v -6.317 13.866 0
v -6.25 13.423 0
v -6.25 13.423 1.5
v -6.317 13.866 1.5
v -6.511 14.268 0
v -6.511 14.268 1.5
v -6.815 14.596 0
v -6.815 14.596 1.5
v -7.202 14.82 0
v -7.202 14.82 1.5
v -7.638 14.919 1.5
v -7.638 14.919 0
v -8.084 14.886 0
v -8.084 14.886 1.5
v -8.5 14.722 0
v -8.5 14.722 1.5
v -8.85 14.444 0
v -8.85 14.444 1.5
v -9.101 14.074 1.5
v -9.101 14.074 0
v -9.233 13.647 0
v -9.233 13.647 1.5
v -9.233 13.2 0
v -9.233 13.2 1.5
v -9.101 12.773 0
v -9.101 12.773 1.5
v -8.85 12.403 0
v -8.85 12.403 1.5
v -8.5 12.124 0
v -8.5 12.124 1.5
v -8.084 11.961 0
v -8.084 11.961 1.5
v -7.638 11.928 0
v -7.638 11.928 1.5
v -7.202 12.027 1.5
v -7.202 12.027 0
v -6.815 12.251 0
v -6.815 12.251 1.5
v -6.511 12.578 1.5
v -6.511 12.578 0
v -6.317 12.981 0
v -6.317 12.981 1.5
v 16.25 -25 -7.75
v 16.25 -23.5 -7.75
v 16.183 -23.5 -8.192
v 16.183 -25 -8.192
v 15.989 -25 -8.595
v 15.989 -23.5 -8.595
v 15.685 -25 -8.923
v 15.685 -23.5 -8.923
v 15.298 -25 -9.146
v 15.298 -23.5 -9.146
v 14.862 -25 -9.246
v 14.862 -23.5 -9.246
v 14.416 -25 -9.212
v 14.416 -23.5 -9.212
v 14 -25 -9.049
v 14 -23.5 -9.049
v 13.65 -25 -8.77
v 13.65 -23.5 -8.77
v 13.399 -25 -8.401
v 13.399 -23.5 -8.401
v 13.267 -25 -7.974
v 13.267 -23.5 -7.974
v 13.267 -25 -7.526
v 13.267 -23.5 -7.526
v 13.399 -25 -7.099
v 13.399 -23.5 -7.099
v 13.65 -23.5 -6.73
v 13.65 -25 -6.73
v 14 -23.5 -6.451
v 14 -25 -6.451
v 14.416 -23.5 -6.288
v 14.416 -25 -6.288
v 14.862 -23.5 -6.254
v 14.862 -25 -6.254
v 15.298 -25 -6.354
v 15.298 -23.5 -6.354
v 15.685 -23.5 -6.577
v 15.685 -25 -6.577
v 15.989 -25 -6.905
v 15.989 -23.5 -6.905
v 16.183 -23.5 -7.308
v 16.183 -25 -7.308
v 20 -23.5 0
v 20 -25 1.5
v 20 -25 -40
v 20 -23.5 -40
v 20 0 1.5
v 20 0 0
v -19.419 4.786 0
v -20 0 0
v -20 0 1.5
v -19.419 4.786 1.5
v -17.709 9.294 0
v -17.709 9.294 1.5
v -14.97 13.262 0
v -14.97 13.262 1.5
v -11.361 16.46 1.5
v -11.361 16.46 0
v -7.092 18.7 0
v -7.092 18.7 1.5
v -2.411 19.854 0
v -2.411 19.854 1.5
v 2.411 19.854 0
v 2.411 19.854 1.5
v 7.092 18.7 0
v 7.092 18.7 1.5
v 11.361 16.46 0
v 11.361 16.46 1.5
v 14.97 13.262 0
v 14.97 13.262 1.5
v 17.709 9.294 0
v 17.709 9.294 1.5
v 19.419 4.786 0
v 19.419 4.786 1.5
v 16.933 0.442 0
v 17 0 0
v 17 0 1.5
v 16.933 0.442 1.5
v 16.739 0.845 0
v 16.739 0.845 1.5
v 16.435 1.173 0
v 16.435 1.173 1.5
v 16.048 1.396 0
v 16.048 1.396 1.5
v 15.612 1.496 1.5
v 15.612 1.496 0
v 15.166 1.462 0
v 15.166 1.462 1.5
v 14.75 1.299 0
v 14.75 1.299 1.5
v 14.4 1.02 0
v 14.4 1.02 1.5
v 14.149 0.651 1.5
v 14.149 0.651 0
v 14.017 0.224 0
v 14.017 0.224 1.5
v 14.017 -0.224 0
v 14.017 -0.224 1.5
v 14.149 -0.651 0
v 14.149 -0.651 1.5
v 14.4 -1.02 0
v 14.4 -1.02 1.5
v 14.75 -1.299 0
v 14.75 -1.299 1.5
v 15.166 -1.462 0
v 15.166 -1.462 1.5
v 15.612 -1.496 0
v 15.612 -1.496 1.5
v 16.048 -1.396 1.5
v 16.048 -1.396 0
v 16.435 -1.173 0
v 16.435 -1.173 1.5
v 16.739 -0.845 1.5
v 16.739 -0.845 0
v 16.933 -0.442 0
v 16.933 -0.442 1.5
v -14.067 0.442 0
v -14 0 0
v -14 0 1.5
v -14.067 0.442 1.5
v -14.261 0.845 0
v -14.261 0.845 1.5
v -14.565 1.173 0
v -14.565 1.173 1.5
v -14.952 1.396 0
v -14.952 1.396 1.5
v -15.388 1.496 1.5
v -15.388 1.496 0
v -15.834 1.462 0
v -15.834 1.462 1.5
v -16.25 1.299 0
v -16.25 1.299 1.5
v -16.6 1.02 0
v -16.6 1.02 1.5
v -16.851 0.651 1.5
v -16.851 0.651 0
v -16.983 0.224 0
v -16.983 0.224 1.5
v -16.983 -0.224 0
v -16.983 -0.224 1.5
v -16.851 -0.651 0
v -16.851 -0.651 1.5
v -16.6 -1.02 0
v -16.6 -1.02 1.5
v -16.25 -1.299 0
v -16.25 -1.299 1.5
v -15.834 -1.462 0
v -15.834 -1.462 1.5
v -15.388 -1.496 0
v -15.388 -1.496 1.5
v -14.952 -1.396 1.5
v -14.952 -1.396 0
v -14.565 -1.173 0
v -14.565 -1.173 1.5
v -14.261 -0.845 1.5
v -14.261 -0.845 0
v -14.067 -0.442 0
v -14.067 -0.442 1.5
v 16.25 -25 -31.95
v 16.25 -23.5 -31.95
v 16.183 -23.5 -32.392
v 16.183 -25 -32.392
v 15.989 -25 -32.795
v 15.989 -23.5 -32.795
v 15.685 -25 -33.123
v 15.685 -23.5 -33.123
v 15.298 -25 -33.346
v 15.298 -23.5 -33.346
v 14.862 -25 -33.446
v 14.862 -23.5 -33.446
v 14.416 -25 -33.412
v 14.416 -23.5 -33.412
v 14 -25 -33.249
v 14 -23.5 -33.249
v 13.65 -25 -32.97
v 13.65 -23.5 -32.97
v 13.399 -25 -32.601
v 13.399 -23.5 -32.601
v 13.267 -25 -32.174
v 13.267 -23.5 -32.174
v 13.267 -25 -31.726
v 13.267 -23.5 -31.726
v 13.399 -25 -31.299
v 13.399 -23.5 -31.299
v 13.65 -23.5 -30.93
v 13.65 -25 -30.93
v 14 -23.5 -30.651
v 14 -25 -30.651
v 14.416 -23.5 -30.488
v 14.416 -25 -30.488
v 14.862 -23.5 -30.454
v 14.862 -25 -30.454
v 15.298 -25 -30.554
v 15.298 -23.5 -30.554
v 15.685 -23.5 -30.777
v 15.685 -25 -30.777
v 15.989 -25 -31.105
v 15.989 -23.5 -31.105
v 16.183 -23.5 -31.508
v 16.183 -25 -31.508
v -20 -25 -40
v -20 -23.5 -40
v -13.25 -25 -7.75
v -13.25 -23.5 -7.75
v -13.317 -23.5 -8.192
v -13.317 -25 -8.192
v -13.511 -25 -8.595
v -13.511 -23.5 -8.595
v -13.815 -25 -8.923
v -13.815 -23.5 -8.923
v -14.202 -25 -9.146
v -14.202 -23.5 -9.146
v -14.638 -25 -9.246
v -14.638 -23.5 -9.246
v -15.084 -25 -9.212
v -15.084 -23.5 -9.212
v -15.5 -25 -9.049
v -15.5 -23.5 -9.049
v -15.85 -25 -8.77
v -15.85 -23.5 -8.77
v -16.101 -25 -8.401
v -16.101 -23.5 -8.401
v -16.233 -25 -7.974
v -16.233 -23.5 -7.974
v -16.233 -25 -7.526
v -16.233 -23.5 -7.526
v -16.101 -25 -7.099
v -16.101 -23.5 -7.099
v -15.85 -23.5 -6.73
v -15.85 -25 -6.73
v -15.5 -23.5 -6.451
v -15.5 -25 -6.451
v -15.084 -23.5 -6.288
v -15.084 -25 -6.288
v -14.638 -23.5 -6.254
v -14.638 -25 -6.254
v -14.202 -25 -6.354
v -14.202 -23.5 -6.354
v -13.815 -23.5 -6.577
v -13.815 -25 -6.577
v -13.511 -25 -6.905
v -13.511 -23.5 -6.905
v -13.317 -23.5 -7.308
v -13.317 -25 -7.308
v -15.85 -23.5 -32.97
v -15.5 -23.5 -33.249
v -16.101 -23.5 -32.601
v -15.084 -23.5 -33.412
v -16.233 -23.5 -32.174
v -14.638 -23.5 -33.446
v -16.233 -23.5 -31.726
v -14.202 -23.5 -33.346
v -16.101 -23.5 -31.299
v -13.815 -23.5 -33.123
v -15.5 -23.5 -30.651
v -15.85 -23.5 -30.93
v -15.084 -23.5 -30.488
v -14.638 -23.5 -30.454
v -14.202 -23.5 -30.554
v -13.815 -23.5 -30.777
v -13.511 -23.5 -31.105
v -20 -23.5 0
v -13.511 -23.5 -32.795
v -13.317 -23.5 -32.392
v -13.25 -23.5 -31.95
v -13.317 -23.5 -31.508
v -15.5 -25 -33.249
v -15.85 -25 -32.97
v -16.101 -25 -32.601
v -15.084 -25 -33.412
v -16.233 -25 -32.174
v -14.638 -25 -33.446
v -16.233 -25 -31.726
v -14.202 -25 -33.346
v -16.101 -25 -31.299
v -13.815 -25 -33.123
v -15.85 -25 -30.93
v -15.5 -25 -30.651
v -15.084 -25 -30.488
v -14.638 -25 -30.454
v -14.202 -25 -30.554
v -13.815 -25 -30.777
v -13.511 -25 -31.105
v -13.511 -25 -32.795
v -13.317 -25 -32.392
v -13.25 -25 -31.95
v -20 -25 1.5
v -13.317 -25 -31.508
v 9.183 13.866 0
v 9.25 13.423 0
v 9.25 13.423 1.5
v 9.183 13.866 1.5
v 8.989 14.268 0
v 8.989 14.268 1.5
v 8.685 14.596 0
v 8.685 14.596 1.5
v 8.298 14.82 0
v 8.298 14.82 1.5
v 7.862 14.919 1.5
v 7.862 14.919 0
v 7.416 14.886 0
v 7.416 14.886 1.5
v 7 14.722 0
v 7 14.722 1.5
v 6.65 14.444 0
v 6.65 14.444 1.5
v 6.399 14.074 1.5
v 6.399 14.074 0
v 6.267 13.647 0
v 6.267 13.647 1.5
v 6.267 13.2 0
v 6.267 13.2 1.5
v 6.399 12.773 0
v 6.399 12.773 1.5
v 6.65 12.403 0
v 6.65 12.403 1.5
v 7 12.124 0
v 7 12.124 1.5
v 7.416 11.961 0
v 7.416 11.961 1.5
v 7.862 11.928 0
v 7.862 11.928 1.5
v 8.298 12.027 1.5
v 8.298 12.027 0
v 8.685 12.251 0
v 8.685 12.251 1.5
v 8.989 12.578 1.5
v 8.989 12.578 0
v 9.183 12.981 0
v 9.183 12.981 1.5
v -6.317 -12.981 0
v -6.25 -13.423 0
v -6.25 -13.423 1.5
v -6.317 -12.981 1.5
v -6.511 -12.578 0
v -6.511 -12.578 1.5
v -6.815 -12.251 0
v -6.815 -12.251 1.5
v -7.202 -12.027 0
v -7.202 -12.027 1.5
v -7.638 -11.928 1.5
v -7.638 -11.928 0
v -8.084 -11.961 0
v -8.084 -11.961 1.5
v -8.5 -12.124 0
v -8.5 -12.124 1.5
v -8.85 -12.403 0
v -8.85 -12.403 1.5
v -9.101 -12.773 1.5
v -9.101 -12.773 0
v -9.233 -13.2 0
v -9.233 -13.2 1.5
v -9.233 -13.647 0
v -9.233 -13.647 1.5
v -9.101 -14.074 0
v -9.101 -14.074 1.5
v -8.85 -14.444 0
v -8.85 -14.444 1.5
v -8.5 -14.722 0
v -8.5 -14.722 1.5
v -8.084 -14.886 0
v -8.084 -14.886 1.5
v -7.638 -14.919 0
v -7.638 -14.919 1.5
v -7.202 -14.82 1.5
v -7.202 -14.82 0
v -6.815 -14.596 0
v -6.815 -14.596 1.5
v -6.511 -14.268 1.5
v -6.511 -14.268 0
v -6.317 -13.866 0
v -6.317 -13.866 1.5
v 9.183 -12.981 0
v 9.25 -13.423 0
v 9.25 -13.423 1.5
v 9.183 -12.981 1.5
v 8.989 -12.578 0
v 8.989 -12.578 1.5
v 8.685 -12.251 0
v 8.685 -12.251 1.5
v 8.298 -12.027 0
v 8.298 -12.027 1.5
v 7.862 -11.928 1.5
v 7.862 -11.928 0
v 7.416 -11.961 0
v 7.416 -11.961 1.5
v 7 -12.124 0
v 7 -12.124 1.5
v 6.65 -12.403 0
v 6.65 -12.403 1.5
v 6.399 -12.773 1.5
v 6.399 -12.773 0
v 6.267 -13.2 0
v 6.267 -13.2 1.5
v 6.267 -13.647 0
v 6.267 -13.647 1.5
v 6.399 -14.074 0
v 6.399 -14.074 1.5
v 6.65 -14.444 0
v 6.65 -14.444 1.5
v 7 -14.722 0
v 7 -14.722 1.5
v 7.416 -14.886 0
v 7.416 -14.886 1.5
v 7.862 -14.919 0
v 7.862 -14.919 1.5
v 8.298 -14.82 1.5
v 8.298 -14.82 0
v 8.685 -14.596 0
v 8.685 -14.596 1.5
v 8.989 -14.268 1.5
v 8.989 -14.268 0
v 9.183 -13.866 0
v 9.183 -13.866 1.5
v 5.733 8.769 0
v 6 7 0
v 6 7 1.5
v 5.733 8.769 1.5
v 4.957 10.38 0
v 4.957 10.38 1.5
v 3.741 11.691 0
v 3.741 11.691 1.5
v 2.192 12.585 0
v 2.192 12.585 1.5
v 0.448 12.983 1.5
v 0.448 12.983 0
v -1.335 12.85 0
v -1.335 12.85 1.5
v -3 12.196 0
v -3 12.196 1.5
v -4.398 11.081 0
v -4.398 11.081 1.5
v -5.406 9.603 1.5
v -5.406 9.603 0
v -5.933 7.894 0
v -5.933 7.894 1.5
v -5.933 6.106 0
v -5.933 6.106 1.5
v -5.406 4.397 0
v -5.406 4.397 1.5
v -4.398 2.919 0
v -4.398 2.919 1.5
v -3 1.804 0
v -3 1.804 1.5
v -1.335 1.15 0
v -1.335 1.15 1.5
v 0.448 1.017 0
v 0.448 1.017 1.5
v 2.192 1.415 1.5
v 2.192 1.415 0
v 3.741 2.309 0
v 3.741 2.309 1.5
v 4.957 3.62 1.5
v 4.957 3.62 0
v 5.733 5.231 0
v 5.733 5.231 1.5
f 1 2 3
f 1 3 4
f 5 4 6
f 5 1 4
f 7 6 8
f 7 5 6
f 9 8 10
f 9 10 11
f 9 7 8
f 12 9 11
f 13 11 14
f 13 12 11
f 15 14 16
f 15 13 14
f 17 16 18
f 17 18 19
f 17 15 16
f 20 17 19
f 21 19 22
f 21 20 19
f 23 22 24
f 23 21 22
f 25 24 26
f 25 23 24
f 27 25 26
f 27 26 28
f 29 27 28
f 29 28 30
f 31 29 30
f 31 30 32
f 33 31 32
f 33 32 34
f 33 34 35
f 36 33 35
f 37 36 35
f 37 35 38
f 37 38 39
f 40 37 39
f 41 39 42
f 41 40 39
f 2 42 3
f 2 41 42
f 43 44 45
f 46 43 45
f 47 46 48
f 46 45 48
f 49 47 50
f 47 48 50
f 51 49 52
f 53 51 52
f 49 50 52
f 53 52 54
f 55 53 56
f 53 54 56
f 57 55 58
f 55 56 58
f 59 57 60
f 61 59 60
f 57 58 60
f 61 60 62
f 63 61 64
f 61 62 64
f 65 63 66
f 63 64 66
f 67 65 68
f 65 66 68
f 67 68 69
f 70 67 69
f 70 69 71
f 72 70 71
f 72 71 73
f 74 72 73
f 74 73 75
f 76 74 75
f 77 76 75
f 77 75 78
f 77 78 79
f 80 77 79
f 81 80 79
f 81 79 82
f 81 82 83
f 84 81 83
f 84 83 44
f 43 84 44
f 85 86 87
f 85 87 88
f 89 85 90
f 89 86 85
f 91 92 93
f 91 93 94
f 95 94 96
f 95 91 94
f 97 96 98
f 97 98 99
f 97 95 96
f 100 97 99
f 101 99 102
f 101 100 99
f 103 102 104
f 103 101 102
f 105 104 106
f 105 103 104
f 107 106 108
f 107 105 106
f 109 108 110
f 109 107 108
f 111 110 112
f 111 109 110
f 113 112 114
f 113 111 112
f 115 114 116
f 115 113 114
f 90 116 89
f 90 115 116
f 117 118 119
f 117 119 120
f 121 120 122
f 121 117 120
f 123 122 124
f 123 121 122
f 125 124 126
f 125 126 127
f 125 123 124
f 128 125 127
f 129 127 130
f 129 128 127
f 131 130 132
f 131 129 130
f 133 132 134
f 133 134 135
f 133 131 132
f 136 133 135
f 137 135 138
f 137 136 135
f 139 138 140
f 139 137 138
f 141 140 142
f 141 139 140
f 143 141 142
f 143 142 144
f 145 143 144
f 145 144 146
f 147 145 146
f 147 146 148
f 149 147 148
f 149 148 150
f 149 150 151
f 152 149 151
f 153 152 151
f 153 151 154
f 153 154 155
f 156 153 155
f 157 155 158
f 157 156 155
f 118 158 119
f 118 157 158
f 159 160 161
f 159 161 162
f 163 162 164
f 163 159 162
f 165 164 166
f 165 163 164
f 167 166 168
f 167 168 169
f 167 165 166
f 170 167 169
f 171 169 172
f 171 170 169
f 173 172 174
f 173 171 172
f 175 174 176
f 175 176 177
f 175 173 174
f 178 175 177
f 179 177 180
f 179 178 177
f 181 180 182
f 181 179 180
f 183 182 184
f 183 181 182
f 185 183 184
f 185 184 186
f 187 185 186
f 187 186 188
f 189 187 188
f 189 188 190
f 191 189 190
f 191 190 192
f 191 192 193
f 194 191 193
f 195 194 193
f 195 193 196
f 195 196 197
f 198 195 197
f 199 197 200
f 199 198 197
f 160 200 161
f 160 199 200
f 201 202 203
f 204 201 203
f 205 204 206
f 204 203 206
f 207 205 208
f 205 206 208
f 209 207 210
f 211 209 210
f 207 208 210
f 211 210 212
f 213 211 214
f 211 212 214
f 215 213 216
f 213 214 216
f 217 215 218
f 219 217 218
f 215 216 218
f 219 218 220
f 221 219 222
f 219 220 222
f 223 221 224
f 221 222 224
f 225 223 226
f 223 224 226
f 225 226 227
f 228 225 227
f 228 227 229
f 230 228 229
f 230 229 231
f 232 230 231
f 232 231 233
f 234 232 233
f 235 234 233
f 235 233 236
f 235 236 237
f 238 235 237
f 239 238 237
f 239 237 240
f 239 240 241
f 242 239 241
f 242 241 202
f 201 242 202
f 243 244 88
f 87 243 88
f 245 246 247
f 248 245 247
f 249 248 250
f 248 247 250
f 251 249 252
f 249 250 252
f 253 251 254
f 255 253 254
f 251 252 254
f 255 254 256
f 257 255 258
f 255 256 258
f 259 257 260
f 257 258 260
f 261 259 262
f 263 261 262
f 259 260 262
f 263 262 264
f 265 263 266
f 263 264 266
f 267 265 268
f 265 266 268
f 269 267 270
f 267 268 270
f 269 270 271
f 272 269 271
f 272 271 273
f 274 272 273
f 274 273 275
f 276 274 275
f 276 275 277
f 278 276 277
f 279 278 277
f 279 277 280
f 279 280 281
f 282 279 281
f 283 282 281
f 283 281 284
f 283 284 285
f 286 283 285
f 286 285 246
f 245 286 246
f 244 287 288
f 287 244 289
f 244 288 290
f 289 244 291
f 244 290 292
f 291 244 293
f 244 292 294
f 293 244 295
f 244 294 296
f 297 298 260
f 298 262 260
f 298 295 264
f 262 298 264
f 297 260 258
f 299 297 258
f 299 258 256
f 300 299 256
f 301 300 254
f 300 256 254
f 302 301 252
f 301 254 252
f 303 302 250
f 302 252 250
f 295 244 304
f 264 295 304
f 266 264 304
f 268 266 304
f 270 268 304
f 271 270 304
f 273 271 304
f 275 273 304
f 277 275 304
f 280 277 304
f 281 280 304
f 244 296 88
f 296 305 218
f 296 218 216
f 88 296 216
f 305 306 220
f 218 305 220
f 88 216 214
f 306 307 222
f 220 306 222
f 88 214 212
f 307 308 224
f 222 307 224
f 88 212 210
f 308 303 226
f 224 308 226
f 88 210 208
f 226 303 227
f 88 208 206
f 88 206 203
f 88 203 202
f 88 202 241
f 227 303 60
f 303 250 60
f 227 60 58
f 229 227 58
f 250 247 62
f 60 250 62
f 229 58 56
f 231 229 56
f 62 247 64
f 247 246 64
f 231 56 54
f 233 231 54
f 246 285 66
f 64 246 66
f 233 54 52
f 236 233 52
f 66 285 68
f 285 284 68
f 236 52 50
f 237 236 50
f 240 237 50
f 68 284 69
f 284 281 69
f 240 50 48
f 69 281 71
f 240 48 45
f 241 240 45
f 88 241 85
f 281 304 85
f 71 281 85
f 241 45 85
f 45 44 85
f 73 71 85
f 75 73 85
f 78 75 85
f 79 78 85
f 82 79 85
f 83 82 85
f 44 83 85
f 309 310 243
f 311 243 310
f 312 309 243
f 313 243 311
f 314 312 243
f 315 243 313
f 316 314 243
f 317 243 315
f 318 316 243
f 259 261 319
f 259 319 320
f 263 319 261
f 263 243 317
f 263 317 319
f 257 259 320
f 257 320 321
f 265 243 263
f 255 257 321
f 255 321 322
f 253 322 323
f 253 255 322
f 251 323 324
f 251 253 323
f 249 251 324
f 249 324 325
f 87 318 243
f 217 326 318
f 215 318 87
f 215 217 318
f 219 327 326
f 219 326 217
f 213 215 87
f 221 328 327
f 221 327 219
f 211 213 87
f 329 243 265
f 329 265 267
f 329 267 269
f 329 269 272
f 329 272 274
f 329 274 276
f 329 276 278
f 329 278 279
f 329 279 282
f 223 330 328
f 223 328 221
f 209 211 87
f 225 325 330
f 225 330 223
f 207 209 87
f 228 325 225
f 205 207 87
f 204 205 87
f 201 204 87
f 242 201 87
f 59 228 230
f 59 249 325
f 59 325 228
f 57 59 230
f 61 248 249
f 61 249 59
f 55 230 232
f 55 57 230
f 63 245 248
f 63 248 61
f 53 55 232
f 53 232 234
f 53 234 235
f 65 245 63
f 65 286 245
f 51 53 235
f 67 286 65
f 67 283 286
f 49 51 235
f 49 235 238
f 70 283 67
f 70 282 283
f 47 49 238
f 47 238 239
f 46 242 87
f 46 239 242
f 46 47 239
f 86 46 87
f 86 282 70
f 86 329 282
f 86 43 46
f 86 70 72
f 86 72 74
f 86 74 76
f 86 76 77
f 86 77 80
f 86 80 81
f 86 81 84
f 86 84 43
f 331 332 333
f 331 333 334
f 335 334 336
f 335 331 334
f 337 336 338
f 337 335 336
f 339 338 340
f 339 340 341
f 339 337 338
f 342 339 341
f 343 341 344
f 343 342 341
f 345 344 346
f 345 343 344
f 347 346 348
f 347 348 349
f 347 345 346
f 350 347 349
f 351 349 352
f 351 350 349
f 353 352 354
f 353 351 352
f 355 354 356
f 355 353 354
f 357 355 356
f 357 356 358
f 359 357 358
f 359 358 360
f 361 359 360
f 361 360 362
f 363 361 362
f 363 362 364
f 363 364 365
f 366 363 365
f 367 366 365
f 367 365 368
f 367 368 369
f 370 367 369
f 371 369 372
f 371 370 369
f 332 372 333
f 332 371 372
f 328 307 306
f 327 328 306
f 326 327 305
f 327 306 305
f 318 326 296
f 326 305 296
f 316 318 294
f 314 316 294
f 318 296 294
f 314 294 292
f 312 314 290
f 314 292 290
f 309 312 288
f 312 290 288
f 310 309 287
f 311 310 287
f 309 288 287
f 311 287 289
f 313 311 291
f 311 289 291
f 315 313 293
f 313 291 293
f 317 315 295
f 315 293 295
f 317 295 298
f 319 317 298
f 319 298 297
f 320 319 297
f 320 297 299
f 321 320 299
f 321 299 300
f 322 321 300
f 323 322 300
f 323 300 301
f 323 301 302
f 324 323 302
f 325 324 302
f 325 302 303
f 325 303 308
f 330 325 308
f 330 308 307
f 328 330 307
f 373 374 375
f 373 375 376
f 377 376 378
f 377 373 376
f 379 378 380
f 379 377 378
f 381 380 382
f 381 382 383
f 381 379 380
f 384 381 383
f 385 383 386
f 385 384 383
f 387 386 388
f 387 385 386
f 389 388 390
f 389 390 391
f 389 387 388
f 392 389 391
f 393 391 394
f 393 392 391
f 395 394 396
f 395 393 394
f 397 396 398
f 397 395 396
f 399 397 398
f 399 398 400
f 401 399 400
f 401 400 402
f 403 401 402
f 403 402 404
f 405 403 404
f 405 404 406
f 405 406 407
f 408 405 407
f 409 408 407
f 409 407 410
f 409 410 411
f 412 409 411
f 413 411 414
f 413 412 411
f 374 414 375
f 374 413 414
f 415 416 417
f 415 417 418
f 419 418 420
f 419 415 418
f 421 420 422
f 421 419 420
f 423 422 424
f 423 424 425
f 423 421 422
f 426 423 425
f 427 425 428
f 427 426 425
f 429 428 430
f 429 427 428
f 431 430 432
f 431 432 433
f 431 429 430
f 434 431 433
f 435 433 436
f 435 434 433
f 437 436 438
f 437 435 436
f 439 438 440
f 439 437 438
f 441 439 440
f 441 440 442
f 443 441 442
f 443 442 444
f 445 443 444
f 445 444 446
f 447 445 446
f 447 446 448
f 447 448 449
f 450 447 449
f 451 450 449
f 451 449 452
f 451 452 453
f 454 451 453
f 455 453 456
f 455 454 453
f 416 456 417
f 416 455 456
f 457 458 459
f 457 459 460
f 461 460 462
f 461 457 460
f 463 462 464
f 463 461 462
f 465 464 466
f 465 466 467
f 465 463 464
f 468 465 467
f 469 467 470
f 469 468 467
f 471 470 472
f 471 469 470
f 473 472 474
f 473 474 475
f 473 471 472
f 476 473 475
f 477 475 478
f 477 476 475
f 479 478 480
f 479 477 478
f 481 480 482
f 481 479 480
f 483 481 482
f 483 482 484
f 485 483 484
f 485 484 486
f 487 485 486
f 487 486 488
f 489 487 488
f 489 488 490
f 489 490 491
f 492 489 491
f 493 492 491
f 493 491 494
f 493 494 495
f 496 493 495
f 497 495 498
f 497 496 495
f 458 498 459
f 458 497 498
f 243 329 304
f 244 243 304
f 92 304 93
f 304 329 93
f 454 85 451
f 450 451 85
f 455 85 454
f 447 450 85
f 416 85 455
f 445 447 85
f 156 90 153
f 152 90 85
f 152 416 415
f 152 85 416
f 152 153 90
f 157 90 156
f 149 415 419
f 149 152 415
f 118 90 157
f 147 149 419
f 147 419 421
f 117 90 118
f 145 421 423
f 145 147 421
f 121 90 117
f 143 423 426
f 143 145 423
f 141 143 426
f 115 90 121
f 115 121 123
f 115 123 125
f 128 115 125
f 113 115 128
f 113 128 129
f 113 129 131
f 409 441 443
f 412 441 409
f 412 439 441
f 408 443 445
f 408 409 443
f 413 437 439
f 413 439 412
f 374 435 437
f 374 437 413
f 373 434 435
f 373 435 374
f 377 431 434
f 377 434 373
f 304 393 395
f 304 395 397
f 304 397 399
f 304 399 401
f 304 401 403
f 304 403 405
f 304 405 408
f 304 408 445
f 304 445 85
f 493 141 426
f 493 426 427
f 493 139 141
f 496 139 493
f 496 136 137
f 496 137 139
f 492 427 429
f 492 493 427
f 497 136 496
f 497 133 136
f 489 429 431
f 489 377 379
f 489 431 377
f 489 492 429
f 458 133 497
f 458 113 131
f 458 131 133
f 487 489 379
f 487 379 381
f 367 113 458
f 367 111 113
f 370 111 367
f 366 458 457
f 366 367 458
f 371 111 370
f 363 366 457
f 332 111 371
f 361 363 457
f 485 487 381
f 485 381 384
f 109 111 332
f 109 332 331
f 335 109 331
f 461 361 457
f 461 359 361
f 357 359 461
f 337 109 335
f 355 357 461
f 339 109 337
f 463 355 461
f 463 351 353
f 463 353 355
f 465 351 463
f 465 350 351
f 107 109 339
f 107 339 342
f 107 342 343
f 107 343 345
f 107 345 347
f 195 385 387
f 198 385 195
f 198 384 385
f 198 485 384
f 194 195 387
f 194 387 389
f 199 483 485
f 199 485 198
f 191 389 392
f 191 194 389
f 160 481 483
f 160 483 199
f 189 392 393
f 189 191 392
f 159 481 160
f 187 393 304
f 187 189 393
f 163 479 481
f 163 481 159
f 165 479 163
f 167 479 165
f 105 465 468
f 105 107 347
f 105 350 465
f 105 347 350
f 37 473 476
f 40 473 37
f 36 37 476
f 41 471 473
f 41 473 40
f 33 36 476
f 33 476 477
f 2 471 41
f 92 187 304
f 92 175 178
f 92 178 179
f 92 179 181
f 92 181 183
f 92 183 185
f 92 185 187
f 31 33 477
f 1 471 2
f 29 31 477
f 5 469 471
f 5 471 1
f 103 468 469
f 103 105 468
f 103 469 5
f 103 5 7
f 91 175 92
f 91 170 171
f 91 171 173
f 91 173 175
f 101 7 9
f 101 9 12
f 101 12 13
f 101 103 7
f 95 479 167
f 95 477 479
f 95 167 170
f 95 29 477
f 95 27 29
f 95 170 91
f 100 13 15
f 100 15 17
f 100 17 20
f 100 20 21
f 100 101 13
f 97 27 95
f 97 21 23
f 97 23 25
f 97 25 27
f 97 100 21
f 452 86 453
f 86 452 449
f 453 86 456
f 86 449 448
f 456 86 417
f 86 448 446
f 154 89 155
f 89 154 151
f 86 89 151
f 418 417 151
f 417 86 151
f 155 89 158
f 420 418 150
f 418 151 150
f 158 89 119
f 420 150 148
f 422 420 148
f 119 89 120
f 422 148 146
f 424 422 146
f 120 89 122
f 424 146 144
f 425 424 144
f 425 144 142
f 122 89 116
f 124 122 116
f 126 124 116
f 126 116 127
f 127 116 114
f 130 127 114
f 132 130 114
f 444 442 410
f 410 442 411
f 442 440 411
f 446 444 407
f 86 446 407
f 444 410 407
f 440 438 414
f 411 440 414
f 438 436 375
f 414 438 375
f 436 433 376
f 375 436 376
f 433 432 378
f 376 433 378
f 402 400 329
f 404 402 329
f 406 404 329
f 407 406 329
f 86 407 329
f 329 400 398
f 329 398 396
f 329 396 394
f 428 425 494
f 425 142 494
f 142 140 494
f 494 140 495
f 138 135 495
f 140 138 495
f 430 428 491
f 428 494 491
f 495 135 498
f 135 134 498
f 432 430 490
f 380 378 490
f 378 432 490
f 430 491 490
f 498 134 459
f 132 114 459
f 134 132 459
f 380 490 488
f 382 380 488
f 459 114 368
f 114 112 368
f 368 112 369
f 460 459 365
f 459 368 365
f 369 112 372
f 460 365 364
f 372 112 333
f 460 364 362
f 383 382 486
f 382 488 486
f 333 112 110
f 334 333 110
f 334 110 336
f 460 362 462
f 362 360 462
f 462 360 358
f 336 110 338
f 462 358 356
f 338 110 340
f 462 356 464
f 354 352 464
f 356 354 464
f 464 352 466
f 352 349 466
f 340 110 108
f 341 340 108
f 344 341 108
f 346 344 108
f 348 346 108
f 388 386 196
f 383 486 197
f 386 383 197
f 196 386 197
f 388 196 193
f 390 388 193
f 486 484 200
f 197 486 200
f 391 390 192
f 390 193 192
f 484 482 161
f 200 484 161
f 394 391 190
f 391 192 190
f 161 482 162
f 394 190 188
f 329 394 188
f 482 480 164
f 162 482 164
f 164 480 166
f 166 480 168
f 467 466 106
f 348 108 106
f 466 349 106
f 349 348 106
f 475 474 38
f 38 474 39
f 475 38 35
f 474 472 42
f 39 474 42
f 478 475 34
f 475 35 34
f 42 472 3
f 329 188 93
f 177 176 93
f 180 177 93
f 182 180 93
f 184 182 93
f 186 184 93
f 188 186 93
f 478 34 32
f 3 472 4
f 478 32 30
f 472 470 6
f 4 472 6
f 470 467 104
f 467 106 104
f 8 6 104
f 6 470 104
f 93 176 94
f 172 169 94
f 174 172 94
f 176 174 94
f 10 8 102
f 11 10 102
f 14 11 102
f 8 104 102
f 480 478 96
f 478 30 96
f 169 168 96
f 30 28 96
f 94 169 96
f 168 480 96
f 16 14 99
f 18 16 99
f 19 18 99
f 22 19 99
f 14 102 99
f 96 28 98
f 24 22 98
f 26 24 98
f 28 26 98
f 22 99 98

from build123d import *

# Parameters (mm, degrees)
SKETCH_1_R          = 1.5
SKETCH_1_R_2        = 6
EXTRUDE_1_DEPTH     = 1.5
SKETCH_1_3_W        = 40
SKETCH_1_3_H        = 1.5
EXTRUDE_2_DEPTH     = 40
SKETCH_2_R          = 1.5
CUT_EXTRUDE_1_DEPTH = 63.387899468


with BuildPart() as part:
    # 草图1 → 凸台-拉伸1 (new body)
    with BuildSketch(Plane.XY):
        with BuildLine():
            ThreePointArc((20, 0), (0, 20), (-20, 0))
            Line((-20, 0), (-20, -25))
            Line((-20, -25), (20, -25))
            Line((20, -25), (20, 0))
        make_face()
        with Locations((-7.75, -13.423393759)):
            Circle(SKETCH_1_R, mode=Mode.SUBTRACT)
        with Locations((7.75, -13.423393759)):
            Circle(SKETCH_1_R, mode=Mode.SUBTRACT)
        with Locations((-15.5, 0)):
            Circle(SKETCH_1_R, mode=Mode.SUBTRACT)
        with Locations((-7.75, 13.423393759)):
            Circle(SKETCH_1_R, mode=Mode.SUBTRACT)
        with Locations((0, 7)):
            Circle(SKETCH_1_R_2, mode=Mode.SUBTRACT)
        with Locations((15.5, 0)):
            Circle(SKETCH_1_R, mode=Mode.SUBTRACT)
        with Locations((7.75, 13.423393759)):
            Circle(SKETCH_1_R, mode=Mode.SUBTRACT)
    extrude(amount=EXTRUDE_1_DEPTH)

    # 草图1<3> → 凸台-拉伸2 (add)
    with BuildSketch(Plane.XY):
        with Locations((0, -24.25)):
            Rectangle(SKETCH_1_3_W, SKETCH_1_3_H)
    extrude(amount=-EXTRUDE_2_DEPTH)

    # 草图2 → 切除-拉伸1 (cut, through all)
    with BuildSketch(Plane(origin=(0, -23.5, 0), x_dir=(1, 0, 0), z_dir=(0, 1, 0))):
        with Locations((-14.75, 31.95)):
            Circle(SKETCH_2_R)
        with Locations((-14.75, 7.75)):
            Circle(SKETCH_2_R)
        with Locations((14.75, 7.75)):
            Circle(SKETCH_2_R)
        with Locations((14.75, 31.95)):
            Circle(SKETCH_2_R)
    extrude(amount=-CUT_EXTRUDE_1_DEPTH, mode=Mode.SUBTRACT)


solid = part.part
